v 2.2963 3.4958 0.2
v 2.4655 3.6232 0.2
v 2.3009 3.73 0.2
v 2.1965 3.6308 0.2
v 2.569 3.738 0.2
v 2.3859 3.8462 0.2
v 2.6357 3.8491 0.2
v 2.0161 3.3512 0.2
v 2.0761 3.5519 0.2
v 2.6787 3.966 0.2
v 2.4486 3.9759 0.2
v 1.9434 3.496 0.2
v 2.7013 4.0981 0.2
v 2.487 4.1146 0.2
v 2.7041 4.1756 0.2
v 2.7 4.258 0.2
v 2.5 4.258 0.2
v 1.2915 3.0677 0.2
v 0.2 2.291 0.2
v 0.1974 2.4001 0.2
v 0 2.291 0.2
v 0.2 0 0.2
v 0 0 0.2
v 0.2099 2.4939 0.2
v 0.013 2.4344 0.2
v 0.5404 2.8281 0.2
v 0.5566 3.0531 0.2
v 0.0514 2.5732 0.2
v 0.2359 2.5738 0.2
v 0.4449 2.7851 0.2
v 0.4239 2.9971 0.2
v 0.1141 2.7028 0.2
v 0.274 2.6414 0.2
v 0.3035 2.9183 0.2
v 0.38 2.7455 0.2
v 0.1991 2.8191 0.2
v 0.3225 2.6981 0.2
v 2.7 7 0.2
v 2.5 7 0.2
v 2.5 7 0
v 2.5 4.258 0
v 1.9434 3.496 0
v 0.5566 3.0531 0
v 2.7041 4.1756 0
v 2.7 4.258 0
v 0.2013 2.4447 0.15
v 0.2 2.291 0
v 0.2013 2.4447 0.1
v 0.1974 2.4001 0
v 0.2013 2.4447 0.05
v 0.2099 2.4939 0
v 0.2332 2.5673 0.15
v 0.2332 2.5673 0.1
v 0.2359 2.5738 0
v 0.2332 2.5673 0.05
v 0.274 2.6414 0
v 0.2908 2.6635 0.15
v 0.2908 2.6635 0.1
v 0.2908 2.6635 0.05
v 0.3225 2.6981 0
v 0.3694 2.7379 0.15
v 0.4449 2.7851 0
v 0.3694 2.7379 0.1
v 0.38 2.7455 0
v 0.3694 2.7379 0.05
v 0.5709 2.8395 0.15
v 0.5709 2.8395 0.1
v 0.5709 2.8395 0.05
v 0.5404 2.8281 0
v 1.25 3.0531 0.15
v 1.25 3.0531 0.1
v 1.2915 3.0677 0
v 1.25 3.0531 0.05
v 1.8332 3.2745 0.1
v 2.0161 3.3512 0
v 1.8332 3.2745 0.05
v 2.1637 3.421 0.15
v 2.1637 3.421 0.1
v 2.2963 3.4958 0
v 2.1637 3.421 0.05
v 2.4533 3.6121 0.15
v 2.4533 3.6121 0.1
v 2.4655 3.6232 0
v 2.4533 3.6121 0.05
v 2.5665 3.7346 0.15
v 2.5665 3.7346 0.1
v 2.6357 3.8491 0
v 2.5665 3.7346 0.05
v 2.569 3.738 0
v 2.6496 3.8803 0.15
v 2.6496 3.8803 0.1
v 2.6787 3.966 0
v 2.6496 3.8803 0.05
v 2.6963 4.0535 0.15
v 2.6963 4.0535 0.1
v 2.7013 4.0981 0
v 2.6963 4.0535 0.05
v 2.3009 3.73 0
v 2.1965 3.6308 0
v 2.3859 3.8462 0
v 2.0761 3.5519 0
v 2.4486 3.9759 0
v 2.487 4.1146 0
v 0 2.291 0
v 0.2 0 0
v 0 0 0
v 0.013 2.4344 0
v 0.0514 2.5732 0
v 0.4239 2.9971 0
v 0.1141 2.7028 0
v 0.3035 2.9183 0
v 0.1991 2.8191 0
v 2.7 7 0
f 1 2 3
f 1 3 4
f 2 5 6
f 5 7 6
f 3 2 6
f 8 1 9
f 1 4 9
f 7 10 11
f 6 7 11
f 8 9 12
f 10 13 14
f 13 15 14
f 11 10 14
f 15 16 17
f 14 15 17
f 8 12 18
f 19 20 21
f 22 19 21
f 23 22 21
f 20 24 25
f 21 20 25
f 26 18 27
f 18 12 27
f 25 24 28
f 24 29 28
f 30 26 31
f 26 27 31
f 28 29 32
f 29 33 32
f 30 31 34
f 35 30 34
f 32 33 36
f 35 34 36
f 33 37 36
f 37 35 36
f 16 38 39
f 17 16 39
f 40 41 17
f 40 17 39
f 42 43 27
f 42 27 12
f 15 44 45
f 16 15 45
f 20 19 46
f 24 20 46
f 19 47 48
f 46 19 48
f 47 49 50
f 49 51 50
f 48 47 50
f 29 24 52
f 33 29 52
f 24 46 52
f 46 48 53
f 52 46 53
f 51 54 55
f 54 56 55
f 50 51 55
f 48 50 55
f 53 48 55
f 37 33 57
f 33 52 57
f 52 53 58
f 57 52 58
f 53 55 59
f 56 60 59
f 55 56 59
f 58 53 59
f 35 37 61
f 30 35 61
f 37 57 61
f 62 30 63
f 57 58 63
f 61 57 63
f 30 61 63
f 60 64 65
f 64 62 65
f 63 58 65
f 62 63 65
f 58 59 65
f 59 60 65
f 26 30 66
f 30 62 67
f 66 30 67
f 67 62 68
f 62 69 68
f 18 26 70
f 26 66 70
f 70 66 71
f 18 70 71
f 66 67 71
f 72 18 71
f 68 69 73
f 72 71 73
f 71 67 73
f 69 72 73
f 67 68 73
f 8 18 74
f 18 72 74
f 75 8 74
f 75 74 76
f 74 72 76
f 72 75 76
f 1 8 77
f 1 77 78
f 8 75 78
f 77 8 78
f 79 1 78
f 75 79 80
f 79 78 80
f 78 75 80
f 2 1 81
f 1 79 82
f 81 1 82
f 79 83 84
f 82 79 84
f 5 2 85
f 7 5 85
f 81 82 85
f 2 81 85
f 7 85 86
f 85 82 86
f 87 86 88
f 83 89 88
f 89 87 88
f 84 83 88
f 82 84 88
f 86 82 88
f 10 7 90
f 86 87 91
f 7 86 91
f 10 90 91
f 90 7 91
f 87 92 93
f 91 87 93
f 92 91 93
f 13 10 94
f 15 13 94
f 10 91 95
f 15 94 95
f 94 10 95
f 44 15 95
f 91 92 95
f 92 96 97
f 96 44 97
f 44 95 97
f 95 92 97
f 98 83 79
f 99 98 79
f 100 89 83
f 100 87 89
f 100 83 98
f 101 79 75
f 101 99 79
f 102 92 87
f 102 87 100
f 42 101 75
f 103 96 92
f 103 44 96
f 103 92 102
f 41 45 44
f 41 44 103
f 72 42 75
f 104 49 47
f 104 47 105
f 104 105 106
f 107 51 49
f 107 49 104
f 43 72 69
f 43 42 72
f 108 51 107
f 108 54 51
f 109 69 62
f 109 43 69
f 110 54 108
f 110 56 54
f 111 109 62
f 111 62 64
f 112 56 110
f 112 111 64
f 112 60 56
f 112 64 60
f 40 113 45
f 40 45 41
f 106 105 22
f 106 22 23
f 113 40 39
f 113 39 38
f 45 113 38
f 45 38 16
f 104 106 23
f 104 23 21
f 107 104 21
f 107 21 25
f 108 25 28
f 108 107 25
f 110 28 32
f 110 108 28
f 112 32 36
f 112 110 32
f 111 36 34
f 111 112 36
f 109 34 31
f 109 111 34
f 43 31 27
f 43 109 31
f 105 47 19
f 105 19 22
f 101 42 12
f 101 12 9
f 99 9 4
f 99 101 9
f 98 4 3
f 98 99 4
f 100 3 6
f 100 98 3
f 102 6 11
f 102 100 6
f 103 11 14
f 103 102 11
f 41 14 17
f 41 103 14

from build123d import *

# Parameters (mm, degrees)
RESSALTO_EXTRUS_O1_DEPTH = 0.2


with BuildPart() as part:
    # Esboço1 → Ressalto-extrusão1 (new body)
    with BuildSketch(Plane.XY):
        with BuildLine():
            Line((0, 0), (0, 2.291006443))
            ThreePointArc((0, 2.291006443), (0.153971983, 2.762862143), (0.556619504, 3.053086448))
            Line((0.556619504, 3.053086448), (1.943380496, 3.495967217))
            ThreePointArc((1.943380496, 3.495967217), (2.346028017, 3.786191523), (2.5, 4.258047222))
            Line((2.5, 4.258047222), (2.5, 7))
            Line((2.5, 7), (2.7, 7))
            Line((2.7, 7), (2.7, 4.258047222))
            add(Edge.make_bspline(
                [(0.2, 2.291006443), (0.158704205, 2.746400788), (0.661928351, 2.858924747), (1.298763247, 3.0650825), (2.066064892, 3.359983666), (2.753500887, 3.666979694), (2.7, 4.258047222)],
                knots=[0, 0, 0, 0, 0.272332766, 0.409919088, 0.591592104, 1, 1, 1, 1], degree=3))
            Line((0.2, 2.291006443), (0.2, 0))
            Line((0.2, 0), (0, 0))
        make_face()
    extrude(amount=RESSALTO_EXTRUS_O1_DEPTH)


solid = part.part
